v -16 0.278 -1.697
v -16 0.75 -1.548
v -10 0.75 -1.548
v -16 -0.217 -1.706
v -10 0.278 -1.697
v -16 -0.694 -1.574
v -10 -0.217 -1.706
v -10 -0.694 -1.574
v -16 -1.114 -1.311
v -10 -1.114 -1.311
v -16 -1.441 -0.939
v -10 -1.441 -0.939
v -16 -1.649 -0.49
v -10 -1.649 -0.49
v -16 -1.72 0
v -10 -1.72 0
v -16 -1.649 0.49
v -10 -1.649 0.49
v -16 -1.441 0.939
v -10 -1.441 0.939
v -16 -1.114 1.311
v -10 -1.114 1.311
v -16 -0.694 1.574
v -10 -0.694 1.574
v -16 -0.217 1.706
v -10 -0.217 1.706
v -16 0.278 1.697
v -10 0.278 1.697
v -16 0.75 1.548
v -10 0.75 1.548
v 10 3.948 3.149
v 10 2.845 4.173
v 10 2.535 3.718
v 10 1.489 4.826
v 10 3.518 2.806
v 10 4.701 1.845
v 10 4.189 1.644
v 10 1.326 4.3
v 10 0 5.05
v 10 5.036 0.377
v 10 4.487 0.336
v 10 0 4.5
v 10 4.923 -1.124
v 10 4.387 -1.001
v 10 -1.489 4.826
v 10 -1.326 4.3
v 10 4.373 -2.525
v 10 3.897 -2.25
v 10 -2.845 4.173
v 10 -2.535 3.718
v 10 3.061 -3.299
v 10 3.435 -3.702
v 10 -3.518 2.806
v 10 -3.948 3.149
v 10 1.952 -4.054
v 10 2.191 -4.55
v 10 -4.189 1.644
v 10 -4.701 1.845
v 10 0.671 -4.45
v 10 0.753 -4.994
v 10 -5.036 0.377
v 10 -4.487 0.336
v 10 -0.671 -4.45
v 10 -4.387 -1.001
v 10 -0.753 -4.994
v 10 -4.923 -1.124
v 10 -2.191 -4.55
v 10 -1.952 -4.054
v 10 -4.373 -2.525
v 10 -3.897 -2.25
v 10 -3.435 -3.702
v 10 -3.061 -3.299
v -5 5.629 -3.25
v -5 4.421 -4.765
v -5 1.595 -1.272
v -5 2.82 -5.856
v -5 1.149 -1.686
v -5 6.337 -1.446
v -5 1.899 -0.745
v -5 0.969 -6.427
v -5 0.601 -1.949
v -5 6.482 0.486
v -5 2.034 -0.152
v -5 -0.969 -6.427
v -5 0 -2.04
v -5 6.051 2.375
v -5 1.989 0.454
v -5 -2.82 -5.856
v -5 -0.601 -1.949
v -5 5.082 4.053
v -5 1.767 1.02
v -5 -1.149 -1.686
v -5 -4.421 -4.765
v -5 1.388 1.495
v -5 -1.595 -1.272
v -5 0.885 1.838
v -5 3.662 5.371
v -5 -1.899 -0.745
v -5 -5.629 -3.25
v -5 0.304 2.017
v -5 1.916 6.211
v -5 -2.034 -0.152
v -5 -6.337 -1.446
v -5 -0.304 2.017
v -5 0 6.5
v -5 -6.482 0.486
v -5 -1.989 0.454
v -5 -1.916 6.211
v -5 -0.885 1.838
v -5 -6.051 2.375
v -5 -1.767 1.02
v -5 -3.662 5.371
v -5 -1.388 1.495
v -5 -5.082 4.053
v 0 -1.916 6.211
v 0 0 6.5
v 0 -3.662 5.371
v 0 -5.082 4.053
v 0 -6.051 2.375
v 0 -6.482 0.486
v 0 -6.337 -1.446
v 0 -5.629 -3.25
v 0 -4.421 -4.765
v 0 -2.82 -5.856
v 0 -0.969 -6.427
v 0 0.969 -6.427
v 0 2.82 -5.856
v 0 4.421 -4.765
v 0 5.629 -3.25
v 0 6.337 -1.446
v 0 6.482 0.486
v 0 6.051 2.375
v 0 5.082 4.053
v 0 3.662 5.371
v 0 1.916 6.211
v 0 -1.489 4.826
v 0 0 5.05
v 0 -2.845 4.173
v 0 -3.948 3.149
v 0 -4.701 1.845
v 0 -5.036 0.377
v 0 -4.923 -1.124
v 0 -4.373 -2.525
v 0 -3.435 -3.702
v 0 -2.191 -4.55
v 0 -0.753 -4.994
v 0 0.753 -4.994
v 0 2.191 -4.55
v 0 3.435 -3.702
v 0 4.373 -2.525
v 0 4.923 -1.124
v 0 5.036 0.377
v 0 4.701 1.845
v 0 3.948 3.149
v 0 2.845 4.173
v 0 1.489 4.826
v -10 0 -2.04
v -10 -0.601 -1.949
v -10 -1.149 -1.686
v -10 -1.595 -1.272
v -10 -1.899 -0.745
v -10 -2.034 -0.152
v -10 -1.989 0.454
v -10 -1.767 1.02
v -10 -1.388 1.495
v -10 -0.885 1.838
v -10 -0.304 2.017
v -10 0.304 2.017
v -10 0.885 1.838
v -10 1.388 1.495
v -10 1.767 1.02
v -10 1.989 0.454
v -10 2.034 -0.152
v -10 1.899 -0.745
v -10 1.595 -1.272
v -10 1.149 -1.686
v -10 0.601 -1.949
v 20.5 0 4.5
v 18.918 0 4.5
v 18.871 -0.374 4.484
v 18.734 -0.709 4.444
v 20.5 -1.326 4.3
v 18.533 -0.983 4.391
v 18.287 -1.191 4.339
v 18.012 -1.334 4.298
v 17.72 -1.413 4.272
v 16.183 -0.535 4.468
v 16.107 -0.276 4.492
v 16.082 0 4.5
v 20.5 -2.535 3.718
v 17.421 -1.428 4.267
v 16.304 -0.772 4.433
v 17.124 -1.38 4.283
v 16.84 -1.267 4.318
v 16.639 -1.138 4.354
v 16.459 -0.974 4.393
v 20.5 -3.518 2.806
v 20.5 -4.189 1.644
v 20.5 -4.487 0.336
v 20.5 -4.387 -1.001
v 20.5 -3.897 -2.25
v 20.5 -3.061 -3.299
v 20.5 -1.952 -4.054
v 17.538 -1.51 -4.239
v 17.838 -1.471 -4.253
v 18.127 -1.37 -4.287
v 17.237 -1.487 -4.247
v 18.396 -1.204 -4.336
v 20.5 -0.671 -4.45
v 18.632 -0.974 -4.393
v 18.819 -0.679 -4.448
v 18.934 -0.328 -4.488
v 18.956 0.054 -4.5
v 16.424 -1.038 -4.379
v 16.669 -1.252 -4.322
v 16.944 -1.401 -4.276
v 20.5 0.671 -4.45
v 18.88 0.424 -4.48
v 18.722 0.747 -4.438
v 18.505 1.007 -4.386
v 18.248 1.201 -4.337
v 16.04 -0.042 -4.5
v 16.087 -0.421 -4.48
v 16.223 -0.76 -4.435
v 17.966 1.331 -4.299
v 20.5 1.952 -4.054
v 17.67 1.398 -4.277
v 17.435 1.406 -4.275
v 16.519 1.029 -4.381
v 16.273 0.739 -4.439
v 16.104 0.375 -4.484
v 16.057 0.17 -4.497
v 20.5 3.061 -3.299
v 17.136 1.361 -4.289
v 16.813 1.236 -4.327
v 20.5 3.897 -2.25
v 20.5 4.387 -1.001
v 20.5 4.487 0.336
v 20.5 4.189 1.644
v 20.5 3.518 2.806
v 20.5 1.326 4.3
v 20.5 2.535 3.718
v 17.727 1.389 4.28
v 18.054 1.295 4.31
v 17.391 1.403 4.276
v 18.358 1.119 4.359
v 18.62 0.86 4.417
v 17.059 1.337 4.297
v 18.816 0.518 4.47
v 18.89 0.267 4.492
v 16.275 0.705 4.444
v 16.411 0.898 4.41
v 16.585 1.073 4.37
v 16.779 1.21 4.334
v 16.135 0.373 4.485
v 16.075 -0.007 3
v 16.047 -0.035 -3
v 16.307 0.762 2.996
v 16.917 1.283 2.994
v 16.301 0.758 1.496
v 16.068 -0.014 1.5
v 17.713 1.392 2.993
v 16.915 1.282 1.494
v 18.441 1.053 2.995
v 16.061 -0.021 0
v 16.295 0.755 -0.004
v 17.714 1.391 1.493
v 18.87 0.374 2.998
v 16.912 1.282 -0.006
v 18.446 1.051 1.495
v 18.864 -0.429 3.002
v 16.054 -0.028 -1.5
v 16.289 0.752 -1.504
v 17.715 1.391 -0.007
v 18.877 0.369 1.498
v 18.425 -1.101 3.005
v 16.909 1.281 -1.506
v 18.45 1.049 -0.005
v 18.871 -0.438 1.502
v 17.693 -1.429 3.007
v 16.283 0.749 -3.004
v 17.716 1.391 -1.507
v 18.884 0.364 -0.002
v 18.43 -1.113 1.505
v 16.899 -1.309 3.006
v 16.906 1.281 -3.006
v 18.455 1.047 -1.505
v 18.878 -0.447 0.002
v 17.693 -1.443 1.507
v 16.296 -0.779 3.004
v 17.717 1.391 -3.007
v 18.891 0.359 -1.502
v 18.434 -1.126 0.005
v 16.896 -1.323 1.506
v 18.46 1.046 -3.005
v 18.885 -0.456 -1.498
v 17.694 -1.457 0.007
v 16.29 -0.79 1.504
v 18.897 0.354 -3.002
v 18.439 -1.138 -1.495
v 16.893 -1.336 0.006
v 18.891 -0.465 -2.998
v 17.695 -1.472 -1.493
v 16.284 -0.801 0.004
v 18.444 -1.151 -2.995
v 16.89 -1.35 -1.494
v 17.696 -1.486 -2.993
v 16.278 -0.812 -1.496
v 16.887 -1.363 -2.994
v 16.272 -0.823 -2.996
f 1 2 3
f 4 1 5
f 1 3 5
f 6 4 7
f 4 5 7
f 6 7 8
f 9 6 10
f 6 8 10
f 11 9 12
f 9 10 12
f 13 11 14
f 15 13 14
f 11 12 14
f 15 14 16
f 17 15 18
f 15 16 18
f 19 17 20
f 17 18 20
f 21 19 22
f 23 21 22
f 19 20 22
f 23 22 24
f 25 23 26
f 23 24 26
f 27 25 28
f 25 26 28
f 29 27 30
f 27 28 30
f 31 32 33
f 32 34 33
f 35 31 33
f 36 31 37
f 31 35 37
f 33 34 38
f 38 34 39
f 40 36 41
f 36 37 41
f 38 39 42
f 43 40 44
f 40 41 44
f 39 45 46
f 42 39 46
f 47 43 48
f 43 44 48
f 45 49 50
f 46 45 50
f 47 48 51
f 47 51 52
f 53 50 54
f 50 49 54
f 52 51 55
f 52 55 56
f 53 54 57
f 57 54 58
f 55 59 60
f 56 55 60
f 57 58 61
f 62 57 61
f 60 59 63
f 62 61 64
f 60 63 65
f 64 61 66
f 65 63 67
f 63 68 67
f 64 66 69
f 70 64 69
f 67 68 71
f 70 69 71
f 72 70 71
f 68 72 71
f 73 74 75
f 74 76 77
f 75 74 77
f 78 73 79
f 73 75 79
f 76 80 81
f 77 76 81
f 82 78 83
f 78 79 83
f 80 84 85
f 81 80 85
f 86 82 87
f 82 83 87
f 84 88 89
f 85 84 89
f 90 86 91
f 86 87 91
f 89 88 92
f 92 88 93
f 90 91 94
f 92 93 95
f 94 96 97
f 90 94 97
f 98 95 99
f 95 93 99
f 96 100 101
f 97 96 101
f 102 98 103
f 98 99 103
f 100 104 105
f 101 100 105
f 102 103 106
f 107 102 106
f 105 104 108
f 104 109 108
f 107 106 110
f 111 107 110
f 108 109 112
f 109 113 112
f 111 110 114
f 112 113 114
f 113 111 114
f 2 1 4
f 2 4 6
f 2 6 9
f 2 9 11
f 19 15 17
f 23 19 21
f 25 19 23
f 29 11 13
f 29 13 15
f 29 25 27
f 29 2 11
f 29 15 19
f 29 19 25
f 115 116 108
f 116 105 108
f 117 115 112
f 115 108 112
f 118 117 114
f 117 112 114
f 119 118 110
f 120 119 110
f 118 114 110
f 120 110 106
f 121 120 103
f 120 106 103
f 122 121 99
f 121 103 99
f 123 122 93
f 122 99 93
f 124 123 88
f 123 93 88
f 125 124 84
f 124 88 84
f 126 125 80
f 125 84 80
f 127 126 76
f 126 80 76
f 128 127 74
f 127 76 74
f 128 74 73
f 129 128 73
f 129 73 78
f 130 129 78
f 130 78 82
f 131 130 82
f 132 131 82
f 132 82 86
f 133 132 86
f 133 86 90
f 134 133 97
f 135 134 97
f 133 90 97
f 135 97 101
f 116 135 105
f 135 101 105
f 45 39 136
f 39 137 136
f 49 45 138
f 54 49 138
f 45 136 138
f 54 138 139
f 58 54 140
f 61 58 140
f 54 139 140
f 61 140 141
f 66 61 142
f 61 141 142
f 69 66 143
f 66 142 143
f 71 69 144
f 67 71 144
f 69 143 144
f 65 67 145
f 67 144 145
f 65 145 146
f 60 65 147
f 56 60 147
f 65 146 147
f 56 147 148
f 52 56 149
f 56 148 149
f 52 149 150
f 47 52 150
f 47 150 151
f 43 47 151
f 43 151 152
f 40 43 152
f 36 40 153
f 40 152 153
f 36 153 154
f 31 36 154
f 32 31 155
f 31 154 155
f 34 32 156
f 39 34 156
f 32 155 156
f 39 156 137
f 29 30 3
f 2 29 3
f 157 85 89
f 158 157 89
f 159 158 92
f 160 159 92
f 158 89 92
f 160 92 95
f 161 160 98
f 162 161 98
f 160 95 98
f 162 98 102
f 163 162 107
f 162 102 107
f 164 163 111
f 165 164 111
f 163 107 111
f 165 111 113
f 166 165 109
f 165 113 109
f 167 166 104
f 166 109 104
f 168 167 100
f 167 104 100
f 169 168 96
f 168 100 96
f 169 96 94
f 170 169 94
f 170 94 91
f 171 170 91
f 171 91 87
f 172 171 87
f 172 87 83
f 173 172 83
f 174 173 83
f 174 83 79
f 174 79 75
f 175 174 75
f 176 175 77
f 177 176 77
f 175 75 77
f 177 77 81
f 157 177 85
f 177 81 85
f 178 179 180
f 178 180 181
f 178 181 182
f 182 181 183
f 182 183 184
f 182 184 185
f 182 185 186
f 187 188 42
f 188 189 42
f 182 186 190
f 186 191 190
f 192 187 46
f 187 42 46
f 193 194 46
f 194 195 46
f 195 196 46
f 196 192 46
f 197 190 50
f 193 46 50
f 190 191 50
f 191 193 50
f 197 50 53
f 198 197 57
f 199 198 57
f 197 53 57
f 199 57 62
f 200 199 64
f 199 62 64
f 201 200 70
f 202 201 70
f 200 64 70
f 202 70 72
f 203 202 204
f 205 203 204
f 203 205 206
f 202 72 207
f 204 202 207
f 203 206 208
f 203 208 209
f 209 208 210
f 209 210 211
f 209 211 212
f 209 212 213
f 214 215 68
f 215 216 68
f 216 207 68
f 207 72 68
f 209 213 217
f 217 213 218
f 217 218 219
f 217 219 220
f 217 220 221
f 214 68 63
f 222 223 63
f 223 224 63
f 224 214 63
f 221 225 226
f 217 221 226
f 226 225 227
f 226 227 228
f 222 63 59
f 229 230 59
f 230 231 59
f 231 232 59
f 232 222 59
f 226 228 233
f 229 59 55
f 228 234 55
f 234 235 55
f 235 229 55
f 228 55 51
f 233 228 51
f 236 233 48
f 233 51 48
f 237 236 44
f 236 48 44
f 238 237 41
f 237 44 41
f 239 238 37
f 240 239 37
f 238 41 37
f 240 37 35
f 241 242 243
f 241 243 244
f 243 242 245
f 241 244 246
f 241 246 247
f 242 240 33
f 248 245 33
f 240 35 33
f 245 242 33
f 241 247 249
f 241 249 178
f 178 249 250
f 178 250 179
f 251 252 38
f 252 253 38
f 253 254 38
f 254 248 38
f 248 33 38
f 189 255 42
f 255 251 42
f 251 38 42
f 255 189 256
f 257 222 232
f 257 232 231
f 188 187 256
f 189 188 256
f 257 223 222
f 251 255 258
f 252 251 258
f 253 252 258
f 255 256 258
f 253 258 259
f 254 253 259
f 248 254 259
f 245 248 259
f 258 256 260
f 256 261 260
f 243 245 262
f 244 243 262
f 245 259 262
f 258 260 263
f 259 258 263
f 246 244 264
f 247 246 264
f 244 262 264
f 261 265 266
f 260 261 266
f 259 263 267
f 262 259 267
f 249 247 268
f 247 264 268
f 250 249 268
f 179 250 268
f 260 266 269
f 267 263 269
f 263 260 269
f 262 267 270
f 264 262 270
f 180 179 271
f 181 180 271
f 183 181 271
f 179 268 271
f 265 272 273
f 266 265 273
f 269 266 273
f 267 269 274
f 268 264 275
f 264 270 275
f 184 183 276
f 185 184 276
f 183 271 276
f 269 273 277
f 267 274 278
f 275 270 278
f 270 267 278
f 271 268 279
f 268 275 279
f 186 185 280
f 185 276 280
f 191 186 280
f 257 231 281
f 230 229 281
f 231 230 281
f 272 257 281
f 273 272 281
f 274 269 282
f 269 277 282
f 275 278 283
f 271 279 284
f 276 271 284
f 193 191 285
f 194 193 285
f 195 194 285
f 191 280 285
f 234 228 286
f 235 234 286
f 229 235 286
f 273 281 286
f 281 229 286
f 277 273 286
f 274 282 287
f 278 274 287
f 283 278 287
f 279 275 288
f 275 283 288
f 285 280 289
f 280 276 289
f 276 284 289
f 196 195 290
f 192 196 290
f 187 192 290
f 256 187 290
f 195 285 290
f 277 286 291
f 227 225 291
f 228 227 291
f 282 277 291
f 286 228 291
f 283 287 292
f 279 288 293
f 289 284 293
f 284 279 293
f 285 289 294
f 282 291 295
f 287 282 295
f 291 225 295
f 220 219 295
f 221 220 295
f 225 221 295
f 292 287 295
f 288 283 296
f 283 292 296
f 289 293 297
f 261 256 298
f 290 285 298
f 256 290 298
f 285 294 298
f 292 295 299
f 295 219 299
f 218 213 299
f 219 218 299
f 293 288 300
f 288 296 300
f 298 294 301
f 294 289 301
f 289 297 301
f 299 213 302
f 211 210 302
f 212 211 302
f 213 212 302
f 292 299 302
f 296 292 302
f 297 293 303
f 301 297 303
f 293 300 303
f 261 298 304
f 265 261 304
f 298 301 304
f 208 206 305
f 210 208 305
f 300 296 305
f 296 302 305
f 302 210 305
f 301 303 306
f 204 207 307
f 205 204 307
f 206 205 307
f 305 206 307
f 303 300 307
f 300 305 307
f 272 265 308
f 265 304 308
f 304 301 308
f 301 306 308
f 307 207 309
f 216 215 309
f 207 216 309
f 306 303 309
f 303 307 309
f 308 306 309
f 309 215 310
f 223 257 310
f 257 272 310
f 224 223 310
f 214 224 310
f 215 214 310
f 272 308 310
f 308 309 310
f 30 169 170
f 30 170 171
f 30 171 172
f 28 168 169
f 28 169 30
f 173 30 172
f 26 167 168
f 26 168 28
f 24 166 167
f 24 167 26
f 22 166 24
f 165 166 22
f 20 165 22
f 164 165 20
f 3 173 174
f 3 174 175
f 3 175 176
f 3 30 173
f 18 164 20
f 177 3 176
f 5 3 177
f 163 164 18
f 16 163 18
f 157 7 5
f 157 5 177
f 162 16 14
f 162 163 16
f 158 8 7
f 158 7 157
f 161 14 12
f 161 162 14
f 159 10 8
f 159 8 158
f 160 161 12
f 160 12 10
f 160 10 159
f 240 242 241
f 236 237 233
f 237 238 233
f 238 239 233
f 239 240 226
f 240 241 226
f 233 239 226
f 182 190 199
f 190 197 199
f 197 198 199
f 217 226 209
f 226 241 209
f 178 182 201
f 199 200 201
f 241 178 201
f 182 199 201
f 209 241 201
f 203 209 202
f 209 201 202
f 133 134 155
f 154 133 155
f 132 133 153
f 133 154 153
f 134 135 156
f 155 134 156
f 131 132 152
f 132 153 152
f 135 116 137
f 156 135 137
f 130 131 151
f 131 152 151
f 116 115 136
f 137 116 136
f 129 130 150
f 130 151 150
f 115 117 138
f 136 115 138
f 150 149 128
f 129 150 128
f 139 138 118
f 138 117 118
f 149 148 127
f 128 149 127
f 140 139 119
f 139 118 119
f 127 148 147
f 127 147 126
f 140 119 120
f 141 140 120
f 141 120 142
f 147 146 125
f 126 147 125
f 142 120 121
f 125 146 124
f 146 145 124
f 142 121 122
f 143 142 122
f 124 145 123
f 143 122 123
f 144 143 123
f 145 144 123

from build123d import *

# Parameters (mm, degrees)
EXTRUDE_2_DEPTH = 11
SKETCH_5_R      = 2.04
EXTRUDE_3_DEPTH = 5


with BuildPart() as part:
    # 草图1 → 旋转1 (revolve)
    with BuildSketch(Plane.XY, mode=Mode.PRIVATE) as revolve_1_sk:
        Polygon((-5, 0), (0, 0), (20.5, 0), (20.5, 4.5), (10, 4.5), (10, 5.05), (0, 5.05), (0, 6.5), (-5, 6.5), (-5, 5), align=None)
    revolve(revolve_1_sk.sketch.rotate(Axis((-5, 0, 0), (1, 0, 0)), 90), axis=Axis((-5, 0, 0), (1, 0, 0)))

    # 草图3 → 切除-旋转1 (revolve, cut)
    with BuildSketch(Plane(origin=(17.5, 0, 0), x_dir=(0, 0, -1), z_dir=(1, 0, 0)), mode=Mode.PRIVATE) as cut_revolve_1_sk:
        Polygon((-6.680542038, 0), (-6.680542038, 1.407519777), (7.599960071, 1.407519777), (7.599960071, -0.067480223), align=None)
    revolve(cut_revolve_1_sk.sketch.rotate(Axis((17.5, 0, 6.680542038), (0, -0.0047252868789963, -0.9999888357696356)), 270.416383372), axis=Axis((17.5, 0, 6.680542038), (0, -0.0047252868789963, -0.9999888357696356)), mode=Mode.SUBTRACT)

    # 草图4 → 凸台-拉伸2 (add)
    with BuildSketch(Plane.ZY.offset(5)):
        with BuildLine():
            Line((0.04652715, 0.75), (0, 0.75))
            Line((0, 0.75), (-1.547869504, 0.75))
            ThreePointArc((-1.547869504, 0.75), (0, -1.72), (1.547869504, 0.75))
            Line((1.547869504, 0.75), (0.04652715, 0.75))
        make_face()
    extrude(amount=EXTRUDE_2_DEPTH)

    # 草图5 → 凸台-拉伸3 (add)
    with BuildSketch(Plane.ZY.offset(5)):
        with Locations(Location((0, 0, 0), (0, 0, 180))):
            Circle(SKETCH_5_R)
    extrude(amount=EXTRUDE_3_DEPTH)


solid = part.part
